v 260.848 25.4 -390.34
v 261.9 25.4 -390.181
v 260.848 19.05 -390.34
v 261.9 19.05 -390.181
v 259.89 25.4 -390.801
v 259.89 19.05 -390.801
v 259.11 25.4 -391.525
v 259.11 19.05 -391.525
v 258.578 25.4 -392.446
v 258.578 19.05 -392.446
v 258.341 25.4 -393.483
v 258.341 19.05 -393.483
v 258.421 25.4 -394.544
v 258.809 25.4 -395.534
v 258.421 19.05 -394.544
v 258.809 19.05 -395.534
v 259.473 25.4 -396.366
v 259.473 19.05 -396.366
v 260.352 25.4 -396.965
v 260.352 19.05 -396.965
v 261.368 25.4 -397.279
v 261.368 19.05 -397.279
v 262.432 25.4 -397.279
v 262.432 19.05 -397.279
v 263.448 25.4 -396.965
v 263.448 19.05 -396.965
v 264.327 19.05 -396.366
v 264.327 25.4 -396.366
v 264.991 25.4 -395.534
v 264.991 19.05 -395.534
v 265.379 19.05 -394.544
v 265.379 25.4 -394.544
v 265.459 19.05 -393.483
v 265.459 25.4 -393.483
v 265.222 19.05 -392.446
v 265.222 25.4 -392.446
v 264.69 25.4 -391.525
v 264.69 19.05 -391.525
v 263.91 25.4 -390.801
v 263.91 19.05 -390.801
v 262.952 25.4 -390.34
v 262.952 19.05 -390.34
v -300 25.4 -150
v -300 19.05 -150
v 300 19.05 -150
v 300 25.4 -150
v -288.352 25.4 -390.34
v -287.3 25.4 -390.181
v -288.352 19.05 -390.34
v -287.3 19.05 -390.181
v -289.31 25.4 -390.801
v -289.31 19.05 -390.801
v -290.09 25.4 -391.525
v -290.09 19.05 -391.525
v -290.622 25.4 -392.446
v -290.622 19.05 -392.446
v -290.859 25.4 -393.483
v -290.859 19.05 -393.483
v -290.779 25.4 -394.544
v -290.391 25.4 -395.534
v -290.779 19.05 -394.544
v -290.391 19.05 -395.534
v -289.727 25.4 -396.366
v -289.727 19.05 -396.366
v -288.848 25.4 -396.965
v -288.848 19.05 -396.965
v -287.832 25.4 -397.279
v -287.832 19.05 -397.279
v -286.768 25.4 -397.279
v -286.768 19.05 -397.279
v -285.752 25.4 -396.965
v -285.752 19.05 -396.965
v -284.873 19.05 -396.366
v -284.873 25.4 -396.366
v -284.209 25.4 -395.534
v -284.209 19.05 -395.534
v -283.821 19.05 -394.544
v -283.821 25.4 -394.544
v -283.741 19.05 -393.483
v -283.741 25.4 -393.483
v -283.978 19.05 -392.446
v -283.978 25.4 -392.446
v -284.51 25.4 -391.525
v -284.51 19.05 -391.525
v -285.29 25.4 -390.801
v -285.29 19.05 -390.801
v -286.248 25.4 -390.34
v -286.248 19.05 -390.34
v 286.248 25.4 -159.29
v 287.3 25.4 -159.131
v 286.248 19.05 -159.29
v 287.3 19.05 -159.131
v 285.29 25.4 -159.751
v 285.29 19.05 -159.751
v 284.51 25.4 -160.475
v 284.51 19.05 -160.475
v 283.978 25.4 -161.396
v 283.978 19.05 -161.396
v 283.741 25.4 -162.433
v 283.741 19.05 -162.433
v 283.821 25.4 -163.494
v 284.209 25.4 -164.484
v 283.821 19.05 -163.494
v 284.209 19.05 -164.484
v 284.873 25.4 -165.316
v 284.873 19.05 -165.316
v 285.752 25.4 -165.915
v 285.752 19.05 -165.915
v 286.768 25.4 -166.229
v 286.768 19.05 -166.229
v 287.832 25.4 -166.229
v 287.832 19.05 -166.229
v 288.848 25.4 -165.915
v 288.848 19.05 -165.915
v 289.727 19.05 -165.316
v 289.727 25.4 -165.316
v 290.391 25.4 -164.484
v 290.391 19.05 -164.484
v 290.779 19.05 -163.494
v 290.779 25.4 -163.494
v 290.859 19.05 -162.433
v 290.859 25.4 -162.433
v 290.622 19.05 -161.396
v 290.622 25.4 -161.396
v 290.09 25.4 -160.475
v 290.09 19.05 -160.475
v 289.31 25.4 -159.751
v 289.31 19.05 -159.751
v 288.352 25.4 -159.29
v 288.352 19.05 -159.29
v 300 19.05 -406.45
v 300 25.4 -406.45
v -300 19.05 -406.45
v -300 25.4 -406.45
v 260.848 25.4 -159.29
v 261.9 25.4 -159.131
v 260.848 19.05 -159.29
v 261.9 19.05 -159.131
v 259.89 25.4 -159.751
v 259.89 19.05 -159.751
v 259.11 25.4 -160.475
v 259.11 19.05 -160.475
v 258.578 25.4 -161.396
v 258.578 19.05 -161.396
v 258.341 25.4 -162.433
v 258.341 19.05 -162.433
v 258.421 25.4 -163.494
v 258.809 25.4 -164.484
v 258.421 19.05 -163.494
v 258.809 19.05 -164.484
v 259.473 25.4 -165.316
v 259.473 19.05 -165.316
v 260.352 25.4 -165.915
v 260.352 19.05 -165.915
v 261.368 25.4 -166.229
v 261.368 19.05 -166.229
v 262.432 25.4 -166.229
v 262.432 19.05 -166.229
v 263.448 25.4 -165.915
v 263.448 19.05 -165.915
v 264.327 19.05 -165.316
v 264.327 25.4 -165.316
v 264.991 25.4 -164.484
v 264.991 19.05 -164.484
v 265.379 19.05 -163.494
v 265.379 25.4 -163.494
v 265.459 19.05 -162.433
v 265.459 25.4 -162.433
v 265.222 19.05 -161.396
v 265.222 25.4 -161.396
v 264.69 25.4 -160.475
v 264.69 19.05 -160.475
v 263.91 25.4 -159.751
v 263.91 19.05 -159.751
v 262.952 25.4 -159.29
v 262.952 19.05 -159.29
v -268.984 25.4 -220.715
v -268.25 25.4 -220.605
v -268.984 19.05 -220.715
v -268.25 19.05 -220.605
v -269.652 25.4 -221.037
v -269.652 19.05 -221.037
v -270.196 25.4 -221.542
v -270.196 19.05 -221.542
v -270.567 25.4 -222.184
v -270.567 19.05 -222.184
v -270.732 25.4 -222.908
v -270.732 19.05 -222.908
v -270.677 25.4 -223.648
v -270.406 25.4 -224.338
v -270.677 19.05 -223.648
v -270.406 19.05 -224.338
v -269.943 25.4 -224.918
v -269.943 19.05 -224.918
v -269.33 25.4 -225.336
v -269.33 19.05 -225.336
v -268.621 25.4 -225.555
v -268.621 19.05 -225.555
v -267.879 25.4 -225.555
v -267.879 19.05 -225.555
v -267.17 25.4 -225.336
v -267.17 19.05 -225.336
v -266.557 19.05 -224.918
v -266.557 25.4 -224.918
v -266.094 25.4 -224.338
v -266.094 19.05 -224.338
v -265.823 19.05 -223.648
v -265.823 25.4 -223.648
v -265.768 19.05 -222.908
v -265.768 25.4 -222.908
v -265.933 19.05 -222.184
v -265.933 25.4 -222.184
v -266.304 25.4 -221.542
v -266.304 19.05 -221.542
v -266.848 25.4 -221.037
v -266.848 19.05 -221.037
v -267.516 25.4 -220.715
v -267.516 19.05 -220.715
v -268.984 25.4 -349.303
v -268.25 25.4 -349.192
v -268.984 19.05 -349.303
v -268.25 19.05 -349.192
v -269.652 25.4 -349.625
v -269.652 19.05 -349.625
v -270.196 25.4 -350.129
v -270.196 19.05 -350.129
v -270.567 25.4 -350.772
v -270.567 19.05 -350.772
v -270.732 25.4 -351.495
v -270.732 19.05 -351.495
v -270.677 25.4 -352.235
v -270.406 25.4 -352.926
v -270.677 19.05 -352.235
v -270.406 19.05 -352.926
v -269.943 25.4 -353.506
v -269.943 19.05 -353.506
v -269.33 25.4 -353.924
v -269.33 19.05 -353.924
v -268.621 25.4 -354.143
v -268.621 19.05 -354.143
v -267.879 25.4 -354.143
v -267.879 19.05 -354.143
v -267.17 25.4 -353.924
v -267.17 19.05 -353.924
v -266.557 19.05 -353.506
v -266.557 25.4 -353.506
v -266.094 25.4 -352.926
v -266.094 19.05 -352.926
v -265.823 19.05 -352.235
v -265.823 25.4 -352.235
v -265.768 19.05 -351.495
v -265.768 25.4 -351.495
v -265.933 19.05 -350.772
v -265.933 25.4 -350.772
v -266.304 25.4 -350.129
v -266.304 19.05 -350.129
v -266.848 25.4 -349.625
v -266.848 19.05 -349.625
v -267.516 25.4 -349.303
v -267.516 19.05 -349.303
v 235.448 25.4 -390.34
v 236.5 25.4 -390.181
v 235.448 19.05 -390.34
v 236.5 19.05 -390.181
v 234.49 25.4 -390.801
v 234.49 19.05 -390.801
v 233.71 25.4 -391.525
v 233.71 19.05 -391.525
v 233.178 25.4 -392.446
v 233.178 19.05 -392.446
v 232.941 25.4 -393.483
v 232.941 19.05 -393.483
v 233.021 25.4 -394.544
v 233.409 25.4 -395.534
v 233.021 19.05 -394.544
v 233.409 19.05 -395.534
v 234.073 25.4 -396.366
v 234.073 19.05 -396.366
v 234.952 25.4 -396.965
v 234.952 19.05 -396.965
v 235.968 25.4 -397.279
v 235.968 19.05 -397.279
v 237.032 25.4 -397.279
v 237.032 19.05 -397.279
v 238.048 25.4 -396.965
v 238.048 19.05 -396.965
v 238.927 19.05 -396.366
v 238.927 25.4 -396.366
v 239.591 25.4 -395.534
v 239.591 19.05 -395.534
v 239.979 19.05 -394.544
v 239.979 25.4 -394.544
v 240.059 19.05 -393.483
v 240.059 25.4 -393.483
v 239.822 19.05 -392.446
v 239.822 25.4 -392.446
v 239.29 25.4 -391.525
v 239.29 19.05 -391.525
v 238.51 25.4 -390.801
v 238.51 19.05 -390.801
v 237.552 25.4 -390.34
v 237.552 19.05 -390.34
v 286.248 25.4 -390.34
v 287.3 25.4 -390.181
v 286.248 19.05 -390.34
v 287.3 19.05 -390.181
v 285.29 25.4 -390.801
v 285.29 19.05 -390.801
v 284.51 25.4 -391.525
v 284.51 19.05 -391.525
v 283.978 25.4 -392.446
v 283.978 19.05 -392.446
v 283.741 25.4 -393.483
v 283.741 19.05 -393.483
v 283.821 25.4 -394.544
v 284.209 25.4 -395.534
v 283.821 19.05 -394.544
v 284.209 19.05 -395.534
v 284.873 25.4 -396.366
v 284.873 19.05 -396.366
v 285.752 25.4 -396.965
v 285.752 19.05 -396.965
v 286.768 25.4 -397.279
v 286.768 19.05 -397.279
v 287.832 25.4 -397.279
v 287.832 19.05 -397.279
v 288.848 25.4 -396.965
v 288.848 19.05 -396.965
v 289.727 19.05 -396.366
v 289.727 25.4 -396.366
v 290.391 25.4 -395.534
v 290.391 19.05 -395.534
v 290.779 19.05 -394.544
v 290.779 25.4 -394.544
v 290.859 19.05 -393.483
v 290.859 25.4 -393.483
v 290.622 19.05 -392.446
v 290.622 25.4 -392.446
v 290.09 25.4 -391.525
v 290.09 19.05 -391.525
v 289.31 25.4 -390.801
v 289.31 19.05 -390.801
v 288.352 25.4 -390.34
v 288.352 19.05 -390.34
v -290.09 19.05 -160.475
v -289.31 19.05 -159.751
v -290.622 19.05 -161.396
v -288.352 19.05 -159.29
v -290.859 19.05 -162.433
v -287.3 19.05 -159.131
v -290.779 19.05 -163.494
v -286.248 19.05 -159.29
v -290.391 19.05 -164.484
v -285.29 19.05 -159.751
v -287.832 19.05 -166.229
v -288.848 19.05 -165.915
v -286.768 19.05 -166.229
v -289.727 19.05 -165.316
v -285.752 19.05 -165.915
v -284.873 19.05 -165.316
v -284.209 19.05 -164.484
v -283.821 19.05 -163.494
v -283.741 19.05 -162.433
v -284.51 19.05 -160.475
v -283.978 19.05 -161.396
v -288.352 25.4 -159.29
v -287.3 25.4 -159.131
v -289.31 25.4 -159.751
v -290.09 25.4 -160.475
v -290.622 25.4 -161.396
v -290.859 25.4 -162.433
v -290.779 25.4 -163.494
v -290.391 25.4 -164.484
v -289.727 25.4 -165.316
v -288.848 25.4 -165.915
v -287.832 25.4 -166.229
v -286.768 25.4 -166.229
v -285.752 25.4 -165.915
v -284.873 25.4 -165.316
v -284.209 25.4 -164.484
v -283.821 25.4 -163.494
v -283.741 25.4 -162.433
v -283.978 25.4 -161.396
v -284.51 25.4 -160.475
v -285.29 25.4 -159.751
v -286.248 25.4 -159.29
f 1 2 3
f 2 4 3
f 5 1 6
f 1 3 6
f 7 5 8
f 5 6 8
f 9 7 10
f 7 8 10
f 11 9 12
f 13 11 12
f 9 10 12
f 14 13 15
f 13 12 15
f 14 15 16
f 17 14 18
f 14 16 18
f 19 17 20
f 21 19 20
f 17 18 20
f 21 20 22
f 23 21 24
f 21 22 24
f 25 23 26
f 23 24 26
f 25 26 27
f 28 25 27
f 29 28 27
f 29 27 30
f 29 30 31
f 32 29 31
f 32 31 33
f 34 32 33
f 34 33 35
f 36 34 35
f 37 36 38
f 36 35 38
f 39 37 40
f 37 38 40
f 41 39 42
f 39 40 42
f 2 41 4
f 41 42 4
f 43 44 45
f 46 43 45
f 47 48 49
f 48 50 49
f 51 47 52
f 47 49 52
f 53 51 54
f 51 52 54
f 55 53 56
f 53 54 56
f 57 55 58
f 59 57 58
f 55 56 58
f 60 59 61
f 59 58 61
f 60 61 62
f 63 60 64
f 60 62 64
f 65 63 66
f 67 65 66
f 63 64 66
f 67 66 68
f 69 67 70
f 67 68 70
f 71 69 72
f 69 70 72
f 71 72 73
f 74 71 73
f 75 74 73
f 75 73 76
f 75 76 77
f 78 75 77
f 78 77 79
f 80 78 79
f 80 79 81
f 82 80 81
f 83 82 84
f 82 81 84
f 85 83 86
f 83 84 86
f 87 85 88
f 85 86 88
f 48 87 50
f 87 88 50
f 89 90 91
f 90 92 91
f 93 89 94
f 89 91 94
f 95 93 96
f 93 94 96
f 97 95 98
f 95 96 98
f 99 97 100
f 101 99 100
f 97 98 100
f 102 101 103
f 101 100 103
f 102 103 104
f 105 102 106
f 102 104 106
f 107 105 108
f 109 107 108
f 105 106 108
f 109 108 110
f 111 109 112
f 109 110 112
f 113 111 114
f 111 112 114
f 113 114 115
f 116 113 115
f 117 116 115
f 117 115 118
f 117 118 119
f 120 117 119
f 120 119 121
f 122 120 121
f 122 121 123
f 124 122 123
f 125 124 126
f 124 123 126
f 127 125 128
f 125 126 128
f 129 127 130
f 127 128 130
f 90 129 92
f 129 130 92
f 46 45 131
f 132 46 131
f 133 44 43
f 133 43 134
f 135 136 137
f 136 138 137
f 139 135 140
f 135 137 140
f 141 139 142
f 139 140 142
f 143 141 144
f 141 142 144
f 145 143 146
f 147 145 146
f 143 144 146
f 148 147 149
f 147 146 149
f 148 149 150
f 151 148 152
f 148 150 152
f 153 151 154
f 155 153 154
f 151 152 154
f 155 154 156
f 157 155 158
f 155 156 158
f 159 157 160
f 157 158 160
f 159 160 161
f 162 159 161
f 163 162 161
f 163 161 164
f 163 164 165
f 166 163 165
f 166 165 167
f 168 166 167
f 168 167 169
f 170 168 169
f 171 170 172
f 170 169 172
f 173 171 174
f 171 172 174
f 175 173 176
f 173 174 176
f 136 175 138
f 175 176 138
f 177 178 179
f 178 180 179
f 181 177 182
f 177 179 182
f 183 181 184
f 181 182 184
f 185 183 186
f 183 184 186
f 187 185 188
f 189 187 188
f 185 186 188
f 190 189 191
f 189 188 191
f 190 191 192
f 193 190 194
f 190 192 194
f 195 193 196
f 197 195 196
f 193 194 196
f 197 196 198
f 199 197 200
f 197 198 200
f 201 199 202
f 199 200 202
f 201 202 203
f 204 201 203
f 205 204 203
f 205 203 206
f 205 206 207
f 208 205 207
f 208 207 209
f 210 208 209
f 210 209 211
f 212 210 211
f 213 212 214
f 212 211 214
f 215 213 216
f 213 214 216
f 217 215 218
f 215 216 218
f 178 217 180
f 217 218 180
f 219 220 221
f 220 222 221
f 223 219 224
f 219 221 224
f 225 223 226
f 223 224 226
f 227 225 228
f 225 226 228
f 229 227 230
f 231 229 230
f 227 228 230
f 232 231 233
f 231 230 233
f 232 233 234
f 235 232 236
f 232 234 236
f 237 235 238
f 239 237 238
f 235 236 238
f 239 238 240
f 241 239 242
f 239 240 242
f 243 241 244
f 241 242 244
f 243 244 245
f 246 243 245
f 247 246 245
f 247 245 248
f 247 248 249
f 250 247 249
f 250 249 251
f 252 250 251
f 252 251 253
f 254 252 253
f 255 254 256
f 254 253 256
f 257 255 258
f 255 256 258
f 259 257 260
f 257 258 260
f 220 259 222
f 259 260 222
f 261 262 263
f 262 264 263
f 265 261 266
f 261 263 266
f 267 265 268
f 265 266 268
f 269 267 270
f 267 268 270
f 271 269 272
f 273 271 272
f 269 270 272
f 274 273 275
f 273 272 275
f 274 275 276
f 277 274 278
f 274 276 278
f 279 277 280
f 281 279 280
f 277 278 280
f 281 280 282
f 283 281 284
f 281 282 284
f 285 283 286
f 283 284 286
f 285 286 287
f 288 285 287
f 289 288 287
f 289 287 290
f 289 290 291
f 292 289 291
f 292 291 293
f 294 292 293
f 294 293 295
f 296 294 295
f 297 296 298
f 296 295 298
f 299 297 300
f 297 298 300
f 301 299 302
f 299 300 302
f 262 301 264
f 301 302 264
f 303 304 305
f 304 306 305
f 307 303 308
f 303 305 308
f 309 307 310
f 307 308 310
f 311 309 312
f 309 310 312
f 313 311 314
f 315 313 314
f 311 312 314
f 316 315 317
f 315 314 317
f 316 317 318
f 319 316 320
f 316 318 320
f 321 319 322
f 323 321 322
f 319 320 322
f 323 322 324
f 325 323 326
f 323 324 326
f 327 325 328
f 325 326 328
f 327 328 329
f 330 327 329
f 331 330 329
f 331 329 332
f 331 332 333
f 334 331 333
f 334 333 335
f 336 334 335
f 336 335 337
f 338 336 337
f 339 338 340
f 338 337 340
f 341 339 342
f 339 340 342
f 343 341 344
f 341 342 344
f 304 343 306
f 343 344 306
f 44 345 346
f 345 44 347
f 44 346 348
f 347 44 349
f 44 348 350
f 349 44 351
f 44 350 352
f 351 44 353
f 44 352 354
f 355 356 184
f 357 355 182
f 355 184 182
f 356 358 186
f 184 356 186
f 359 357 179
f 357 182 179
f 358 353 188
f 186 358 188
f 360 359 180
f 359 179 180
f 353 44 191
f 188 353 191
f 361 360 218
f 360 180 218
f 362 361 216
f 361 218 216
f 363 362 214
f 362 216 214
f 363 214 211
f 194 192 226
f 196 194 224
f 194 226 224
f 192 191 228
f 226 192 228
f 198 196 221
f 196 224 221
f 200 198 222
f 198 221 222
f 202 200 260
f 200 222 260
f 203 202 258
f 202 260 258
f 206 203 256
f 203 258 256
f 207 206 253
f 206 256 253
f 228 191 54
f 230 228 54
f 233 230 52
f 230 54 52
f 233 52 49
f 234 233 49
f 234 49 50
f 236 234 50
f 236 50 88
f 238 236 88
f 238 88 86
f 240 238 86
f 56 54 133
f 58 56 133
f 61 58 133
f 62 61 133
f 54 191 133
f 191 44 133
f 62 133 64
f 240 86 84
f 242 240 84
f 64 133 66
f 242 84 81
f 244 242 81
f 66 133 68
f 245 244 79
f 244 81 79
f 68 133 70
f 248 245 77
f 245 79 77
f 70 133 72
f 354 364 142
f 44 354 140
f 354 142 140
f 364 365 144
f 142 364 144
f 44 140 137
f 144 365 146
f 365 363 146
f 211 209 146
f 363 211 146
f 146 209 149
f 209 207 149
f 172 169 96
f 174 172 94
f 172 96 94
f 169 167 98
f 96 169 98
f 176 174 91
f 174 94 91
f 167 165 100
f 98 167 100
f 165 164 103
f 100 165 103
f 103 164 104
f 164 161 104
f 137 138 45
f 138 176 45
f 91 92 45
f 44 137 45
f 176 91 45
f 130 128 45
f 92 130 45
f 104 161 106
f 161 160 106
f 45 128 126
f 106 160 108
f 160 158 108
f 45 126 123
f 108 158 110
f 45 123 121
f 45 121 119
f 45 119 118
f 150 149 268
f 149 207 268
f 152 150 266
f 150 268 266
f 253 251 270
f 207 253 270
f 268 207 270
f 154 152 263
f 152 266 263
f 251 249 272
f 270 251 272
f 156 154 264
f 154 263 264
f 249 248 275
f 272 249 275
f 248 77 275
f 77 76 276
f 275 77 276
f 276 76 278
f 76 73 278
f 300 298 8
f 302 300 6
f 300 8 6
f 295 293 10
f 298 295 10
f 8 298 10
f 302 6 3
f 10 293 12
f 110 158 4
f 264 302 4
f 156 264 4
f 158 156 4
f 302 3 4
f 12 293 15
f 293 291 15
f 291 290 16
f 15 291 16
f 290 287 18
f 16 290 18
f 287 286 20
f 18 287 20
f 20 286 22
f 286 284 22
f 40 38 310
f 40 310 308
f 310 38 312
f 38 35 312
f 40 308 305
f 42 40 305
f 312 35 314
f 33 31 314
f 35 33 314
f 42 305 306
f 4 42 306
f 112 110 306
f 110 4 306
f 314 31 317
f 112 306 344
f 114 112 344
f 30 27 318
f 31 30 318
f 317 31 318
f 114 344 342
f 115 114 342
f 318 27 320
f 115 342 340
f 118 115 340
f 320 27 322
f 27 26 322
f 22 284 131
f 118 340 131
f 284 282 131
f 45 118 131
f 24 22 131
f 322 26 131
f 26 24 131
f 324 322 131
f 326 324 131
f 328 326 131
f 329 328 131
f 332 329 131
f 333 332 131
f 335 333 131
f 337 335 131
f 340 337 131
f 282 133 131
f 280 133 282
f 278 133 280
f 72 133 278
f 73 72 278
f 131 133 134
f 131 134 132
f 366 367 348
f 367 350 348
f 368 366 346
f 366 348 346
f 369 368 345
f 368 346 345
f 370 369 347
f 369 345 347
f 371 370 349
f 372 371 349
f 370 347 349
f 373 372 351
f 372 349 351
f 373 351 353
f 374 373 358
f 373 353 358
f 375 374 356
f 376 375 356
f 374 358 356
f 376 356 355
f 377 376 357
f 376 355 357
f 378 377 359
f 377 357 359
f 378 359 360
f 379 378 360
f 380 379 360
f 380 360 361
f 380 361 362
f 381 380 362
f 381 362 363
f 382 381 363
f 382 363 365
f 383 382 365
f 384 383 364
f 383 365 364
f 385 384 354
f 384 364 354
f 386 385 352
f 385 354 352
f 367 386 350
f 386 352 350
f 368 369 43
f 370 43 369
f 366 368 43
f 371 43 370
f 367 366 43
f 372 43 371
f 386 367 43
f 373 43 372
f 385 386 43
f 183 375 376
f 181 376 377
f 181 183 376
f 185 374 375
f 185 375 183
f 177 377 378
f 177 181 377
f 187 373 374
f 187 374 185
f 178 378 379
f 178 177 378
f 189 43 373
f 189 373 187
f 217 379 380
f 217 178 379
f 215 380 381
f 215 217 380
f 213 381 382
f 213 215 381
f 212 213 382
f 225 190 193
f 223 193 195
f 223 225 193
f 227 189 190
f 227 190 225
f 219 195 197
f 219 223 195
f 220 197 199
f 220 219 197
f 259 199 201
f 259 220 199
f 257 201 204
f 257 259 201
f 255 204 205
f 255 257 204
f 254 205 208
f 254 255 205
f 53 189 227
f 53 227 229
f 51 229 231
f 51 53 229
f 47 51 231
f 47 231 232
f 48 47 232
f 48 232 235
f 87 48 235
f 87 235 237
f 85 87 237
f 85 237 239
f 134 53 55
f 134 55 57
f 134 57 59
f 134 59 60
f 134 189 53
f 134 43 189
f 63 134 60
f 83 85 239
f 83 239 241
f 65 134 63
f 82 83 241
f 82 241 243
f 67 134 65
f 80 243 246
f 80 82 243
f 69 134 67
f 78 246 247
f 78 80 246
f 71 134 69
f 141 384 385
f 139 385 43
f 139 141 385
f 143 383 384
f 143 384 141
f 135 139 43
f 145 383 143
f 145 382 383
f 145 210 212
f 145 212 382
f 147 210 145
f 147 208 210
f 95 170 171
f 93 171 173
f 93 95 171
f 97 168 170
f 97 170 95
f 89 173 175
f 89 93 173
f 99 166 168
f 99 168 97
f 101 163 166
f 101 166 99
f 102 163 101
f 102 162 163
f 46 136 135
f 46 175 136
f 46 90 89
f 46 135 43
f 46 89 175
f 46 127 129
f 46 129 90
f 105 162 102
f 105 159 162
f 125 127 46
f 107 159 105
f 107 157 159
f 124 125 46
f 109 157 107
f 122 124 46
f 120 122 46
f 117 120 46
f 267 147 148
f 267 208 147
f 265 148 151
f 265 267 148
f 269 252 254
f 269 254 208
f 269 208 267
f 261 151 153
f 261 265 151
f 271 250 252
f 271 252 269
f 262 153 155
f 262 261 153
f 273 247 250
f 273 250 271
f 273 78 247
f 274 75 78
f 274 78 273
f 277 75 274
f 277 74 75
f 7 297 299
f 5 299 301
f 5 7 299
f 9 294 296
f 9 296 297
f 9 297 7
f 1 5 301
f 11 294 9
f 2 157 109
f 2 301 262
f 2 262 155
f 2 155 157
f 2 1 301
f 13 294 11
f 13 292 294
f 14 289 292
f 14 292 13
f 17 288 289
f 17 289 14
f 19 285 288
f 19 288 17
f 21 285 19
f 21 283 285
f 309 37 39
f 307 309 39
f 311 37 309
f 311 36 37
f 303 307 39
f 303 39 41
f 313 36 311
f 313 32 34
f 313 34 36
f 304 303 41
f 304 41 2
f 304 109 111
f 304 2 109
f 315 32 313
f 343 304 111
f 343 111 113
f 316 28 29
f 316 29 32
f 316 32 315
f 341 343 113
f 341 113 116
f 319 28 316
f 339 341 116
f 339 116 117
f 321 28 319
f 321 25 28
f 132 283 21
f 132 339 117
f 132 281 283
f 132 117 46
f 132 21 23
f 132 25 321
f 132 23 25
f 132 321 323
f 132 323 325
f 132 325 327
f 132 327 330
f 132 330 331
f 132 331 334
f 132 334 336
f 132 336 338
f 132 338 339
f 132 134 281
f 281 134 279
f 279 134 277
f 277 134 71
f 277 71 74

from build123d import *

# Parameters (mm, degrees)
BOSS_EXTRUDE1_START              = 19.05
SKETCH2_W                        = 600
SKETCH2_H                        = 256.45
BOSS_EXTRUDE1_DEPTH              = 6.35
BOSS_EXTRUDE2_START              = 19.05
SKETCH2_4_W                      = 455.092
SKETCH2_4_H                      = 256.45
BOSS_EXTRUDE2_DEPTH              = 6.35
BOSS_EXTRUDE3_START              = 19.05
SKETCH2_5_W                      = 455.092
SKETCH2_5_H                      = 300
BOSS_EXTRUDE3_DEPTH              = 6.35
SKETCH8_W                        = 3.5687
SKETCH8_H                        = 6.35
F_1_4_CLEARANCE_HOLE2_AT_2_COUNT = 2
F_1_4_CLEARANCE_HOLE2_AT_2_PITCH = 231.05
F_1_4_CLEARANCE_HOLE2_AT_3_COUNT = 2
F_1_4_CLEARANCE_HOLE2_AT_3_PITCH = 595.822744195
F_1_4_CLEARANCE_HOLE2_AT_4_COUNT = 2
F_1_4_CLEARANCE_HOLE2_AT_4_PITCH = 619.31354135
F_1_4_CLEARANCE_HOLE2_AT_5_COUNT = 2
F_1_4_CLEARANCE_HOLE2_AT_5_PITCH = 523.8
F_1_4_CLEARANCE_HOLE2_AT_6_COUNT = 2
F_1_4_CLEARANCE_HOLE2_AT_6_PITCH = 549.2
F_1_4_CLEARANCE_HOLE2_AT_7_COUNT = 2
F_1_4_CLEARANCE_HOLE2_AT_7_PITCH = 574.6
SKETCH10_W                       = 3.5687
SKETCH10_H                       = 6.35
F_1_4_CLEARANCE_HOLE3_AT_2_COUNT = 2
F_1_4_CLEARANCE_HOLE3_AT_2_PITCH = 25.4
F_1_4_CLEARANCE_HOLE3_AT_3_COUNT = 2
F_1_4_CLEARANCE_HOLE3_AT_3_PITCH = 50.8
F_1_4_CLEARANCE_HOLE3_AT_4_COUNT = 2
F_1_4_CLEARANCE_HOLE3_AT_4_PITCH = 231.05
F_1_4_CLEARANCE_HOLE3_AT_5_COUNT = 2
F_1_4_CLEARANCE_HOLE3_AT_5_PITCH = 487.872234672
F_1_4_CLEARANCE_HOLE3_AT_6_COUNT = 2
F_1_4_CLEARANCE_HOLE3_AT_6_PITCH = 476.368698976
F_1_4_CLEARANCE_HOLE3_AT_7_COUNT = 2
F_1_4_CLEARANCE_HOLE3_AT_7_PITCH = 429.692
SKETCH12_W                       = 3.5687
SKETCH12_H                       = 6.35
F_1_4_CLEARANCE_HOLE4_AT_2_COUNT = 2
F_1_4_CLEARANCE_HOLE4_AT_2_PITCH = 25.4
F_1_4_CLEARANCE_HOLE4_AT_3_COUNT = 2
F_1_4_CLEARANCE_HOLE4_AT_3_PITCH = 249.2
F_1_4_CLEARANCE_HOLE4_AT_4_COUNT = 2
F_1_4_CLEARANCE_HOLE4_AT_4_PITCH = 496.725130091
F_1_4_CLEARANCE_HOLE4_AT_5_COUNT = 2
F_1_4_CLEARANCE_HOLE4_AT_5_PITCH = 429.692
F_1_4_CLEARANCE_HOLE4_AT_6_COUNT = 2
F_1_4_CLEARANCE_HOLE4_AT_6_PITCH = 430.442069115
SKETCH14_W                       = 2.4892
SKETCH14_H                       = 6.35
F_8_CLEARANCE_HOLE2_AT_2_COUNT   = 2
F_8_CLEARANCE_HOLE2_AT_2_PITCH   = 128.5875
SKETCH16_W                       = 2.4892
SKETCH16_H                       = 6.35
F_8_CLEARANCE_HOLE3_AT_2_COUNT   = 2
F_8_CLEARANCE_HOLE3_AT_2_PITCH   = 128.5875
SKETCH17_R                       = 3.5687
BOSS_EXTRUDE4_DEPTH              = 6.35
FILLET2_R                        = 6.35
SKETCH18_W                       = 152.4
SKETCH18_H                       = 25.4
SKETCH18_R                       = 3.5687
BOSS_EXTRUDE5_DEPTH              = 6.35
SKETCH19_W                       = 25.4
SKETCH19_H                       = 101.6
SKETCH19_R                       = 3.5687
BOSS_EXTRUDE6_DEPTH              = 6.35


with BuildPart() as part:
    # Sketch2 → Boss-Extrude1 (new body)
    with BuildSketch(Plane(origin=(0, 0, 0), x_dir=(1, 0, 0), z_dir=(0, 1, 0)).offset(BOSS_EXTRUDE1_START)):
        with Locations((0, 278.225)):
            Rectangle(SKETCH2_W, SKETCH2_H)
    extrude(amount=BOSS_EXTRUDE1_DEPTH)

    # Sketch8 → 1/4 Clearance Hole2 (revolve, cut)
    with BuildSketch(Plane(origin=(-287.3, 25.4, -393.75), x_dir=(0, 0, 1), z_dir=(1, 0, 0))):
        with Locations((1.78435, 3.175)):
            Rectangle(SKETCH8_W, SKETCH8_H)
    f_1_4_clearance_hole2 = revolve(axis=Axis((-287.3, 31.75, -393.75), (0, -1, 0)), mode=Mode.SUBTRACT)

    # 1/4 Clearance Hole2 at 2: 1/4 Clearance Hole2 ×2
    with Locations(*[(0, 0, i * F_1_4_CLEARANCE_HOLE2_AT_2_PITCH) for i in range(1, F_1_4_CLEARANCE_HOLE2_AT_2_COUNT)]):
        add(f_1_4_clearance_hole2, mode=Mode.SUBTRACT)

    # 1/4 Clearance Hole2 at 3: 1/4 Clearance Hole2 ×2
    with Locations(*[Vector(0.9217506470687957, 0, 0.3877831154501913) * (i * F_1_4_CLEARANCE_HOLE2_AT_3_PITCH) for i in range(1, F_1_4_CLEARANCE_HOLE2_AT_3_COUNT)]):
        add(f_1_4_clearance_hole2, mode=Mode.SUBTRACT)

    # 1/4 Clearance Hole2 at 4: 1/4 Clearance Hole2 ×2
    with Locations(*[Vector(0.9278014473041833, 0, 0.37307435502894426) * (i * F_1_4_CLEARANCE_HOLE2_AT_4_PITCH) for i in range(1, F_1_4_CLEARANCE_HOLE2_AT_4_COUNT)]):
        add(f_1_4_clearance_hole2, mode=Mode.SUBTRACT)

    # 1/4 Clearance Hole2 at 5: 1/4 Clearance Hole2 ×2
    with Locations(*[(i * F_1_4_CLEARANCE_HOLE2_AT_5_PITCH, 0, 0) for i in range(1, F_1_4_CLEARANCE_HOLE2_AT_5_COUNT)]):
        add(f_1_4_clearance_hole2, mode=Mode.SUBTRACT)

    # 1/4 Clearance Hole2 at 6: 1/4 Clearance Hole2 ×2
    with Locations(*[(i * F_1_4_CLEARANCE_HOLE2_AT_6_PITCH, 0, 0) for i in range(1, F_1_4_CLEARANCE_HOLE2_AT_6_COUNT)]):
        add(f_1_4_clearance_hole2, mode=Mode.SUBTRACT)

    # 1/4 Clearance Hole2 at 7: 1/4 Clearance Hole2 ×2
    with Locations(*[(i * F_1_4_CLEARANCE_HOLE2_AT_7_PITCH, 0, 0) for i in range(1, F_1_4_CLEARANCE_HOLE2_AT_7_COUNT)]):
        add(f_1_4_clearance_hole2, mode=Mode.SUBTRACT)

    # Sketch14 → #8 Clearance Hole2 (revolve, cut)
    with BuildSketch(Plane(origin=(-268.25, 25.4, -351.68125), x_dir=(0, 0, 1), z_dir=(1, 0, 0))):
        with Locations((1.2446, 3.175)):
            Rectangle(SKETCH14_W, SKETCH14_H)
    f_8_clearance_hole2 = revolve(axis=Axis((-268.25, 31.75, -351.68125), (0, -1, 0)), mode=Mode.SUBTRACT)

    # #8 Clearance Hole2 at 2: #8 Clearance Hole2 ×2
    with Locations(*[(0, 0, i * F_8_CLEARANCE_HOLE2_AT_2_PITCH) for i in range(1, F_8_CLEARANCE_HOLE2_AT_2_COUNT)]):
        add(f_8_clearance_hole2, mode=Mode.SUBTRACT)


with BuildPart() as body_2:
    # Sketch2<4> → Boss-Extrude2 (new body)
    with BuildSketch(Plane(origin=(0, 0, 0), x_dir=(1, 0, 0), z_dir=(0, 1, 0)).offset(BOSS_EXTRUDE2_START)):
        with Locations((527.546, 278.225)):
            Rectangle(SKETCH2_4_W, SKETCH2_4_H)
    extrude(amount=BOSS_EXTRUDE2_DEPTH)

    # Sketch10 → 1/4 Clearance Hole3 (revolve, cut)
    with BuildSketch(Plane(origin=(312.7, 25.4, -393.75), x_dir=(0, 0, 1), z_dir=(1, 0, 0))):
        with Locations((1.78435, 3.175)):
            Rectangle(SKETCH10_W, SKETCH10_H)
    f_1_4_clearance_hole3 = revolve(axis=Axis((312.7, 31.75, -393.75), (0, -1, 0)), mode=Mode.SUBTRACT)

    # 1/4 Clearance Hole3 at 2: 1/4 Clearance Hole3 ×2
    with Locations(*[(i * F_1_4_CLEARANCE_HOLE3_AT_2_PITCH, 0, 0) for i in range(1, F_1_4_CLEARANCE_HOLE3_AT_2_COUNT)]):
        add(f_1_4_clearance_hole3, mode=Mode.SUBTRACT)

    # 1/4 Clearance Hole3 at 3: 1/4 Clearance Hole3 ×2
    with Locations(*[(i * F_1_4_CLEARANCE_HOLE3_AT_3_PITCH, 0, 0) for i in range(1, F_1_4_CLEARANCE_HOLE3_AT_3_COUNT)]):
        add(f_1_4_clearance_hole3, mode=Mode.SUBTRACT)

    # 1/4 Clearance Hole3 at 4: 1/4 Clearance Hole3 ×2
    with Locations(*[(0, 0, i * F_1_4_CLEARANCE_HOLE3_AT_4_PITCH) for i in range(1, F_1_4_CLEARANCE_HOLE3_AT_4_COUNT)]):
        add(f_1_4_clearance_hole3, mode=Mode.SUBTRACT)

    # 1/4 Clearance Hole3 at 5: 1/4 Clearance Hole3 ×2
    with Locations(*[Vector(0.880746985506873, 0, 0.47358710658183684) * (i * F_1_4_CLEARANCE_HOLE3_AT_5_PITCH) for i in range(1, F_1_4_CLEARANCE_HOLE3_AT_5_COUNT)]):
        add(f_1_4_clearance_hole3, mode=Mode.SUBTRACT)

    # 1/4 Clearance Hole3 at 6: 1/4 Clearance Hole3 ×2
    with Locations(*[Vector(0.9020156045595491, 0, 0.4317034272866863) * (i * F_1_4_CLEARANCE_HOLE3_AT_6_PITCH) for i in range(1, F_1_4_CLEARANCE_HOLE3_AT_6_COUNT)]):
        add(f_1_4_clearance_hole3, mode=Mode.SUBTRACT)

    # 1/4 Clearance Hole3 at 7: 1/4 Clearance Hole3 ×2
    with Locations(*[(i * F_1_4_CLEARANCE_HOLE3_AT_7_PITCH, 0, 0) for i in range(1, F_1_4_CLEARANCE_HOLE3_AT_7_COUNT)]):
        add(f_1_4_clearance_hole3, mode=Mode.SUBTRACT)

    # Sketch16 → #8 Clearance Hole3 (revolve, cut)
    with BuildSketch(Plane(origin=(723.342, 25.4, -351.68125), x_dir=(0, 0, 1), z_dir=(1, 0, 0))):
        with Locations((1.2446, 3.175)):
            Rectangle(SKETCH16_W, SKETCH16_H)
    f_8_clearance_hole3 = revolve(axis=Axis((723.342, 31.75, -351.68125), (0, -1, 0)), mode=Mode.SUBTRACT)

    # #8 Clearance Hole3 at 2: #8 Clearance Hole3 ×2
    with Locations(*[(0, 0, i * F_8_CLEARANCE_HOLE3_AT_2_PITCH) for i in range(1, F_8_CLEARANCE_HOLE3_AT_2_COUNT)]):
        add(f_8_clearance_hole3, mode=Mode.SUBTRACT)


with BuildPart() as body_3:
    # Sketch2<5> → Boss-Extrude3 (new body)
    with BuildSketch(Plane(origin=(0, 0, 0), x_dir=(1, 0, 0), z_dir=(0, 1, 0)).offset(BOSS_EXTRUDE3_START)):
        with Locations((527.546, 0)):
            Rectangle(SKETCH2_5_W, SKETCH2_5_H)
    extrude(amount=BOSS_EXTRUDE3_DEPTH)

    # Sketch12 → 1/4 Clearance Hole4 (revolve, cut)
    with BuildSketch(Plane(origin=(312.7, 25.4, -111.9), x_dir=(0, 0, 1), z_dir=(1, 0, 0))):
        with Locations((1.78435, 3.175)):
            Rectangle(SKETCH12_W, SKETCH12_H)
    f_1_4_clearance_hole4 = revolve(axis=Axis((312.7, 31.75, -111.9), (0, -1, 0)), mode=Mode.SUBTRACT)

    # 1/4 Clearance Hole4 at 2: 1/4 Clearance Hole4 ×2
    with Locations(*[(0, 0, -i * F_1_4_CLEARANCE_HOLE4_AT_2_PITCH) for i in range(1, F_1_4_CLEARANCE_HOLE4_AT_2_COUNT)]):
        add(f_1_4_clearance_hole4, mode=Mode.SUBTRACT)

    # 1/4 Clearance Hole4 at 3: 1/4 Clearance Hole4 ×2
    with Locations(*[(0, 0, i * F_1_4_CLEARANCE_HOLE4_AT_3_PITCH) for i in range(1, F_1_4_CLEARANCE_HOLE4_AT_3_COUNT)]):
        add(f_1_4_clearance_hole4, mode=Mode.SUBTRACT)

    # 1/4 Clearance Hole4 at 4: 1/4 Clearance Hole4 ×2
    with Locations(*[Vector(0.865049851456502, 0, 0.5016859121951541) * (i * F_1_4_CLEARANCE_HOLE4_AT_4_PITCH) for i in range(1, F_1_4_CLEARANCE_HOLE4_AT_4_COUNT)]):
        add(f_1_4_clearance_hole4, mode=Mode.SUBTRACT)

    # 1/4 Clearance Hole4 at 5: 1/4 Clearance Hole4 ×2
    with Locations(*[(i * F_1_4_CLEARANCE_HOLE4_AT_5_PITCH, 0, 0) for i in range(1, F_1_4_CLEARANCE_HOLE4_AT_5_COUNT)]):
        add(f_1_4_clearance_hole4, mode=Mode.SUBTRACT)

    # 1/4 Clearance Hole4 at 6: 1/4 Clearance Hole4 ×2
    with Locations(*[Vector(0.998257444685787, 0, -0.05900910208944768) * (i * F_1_4_CLEARANCE_HOLE4_AT_6_PITCH) for i in range(1, F_1_4_CLEARANCE_HOLE4_AT_6_COUNT)]):
        add(f_1_4_clearance_hole4, mode=Mode.SUBTRACT)


with BuildPart() as body_4:
    # Sketch17 → Boss-Extrude4 (new body)
    with BuildSketch(Plane(origin=(0, 25.4, 0), x_dir=(1, 0, 0), z_dir=(0, 1, 0))):
        Polygon((249.2, 150), (249.2, 175.4), (325.4, 175.4), (325.4, 99.2), (300, 99.2), (300, 150), align=None)
        with Locations(Location((261.9, 162.7, 0), (0, 0, 270))):
            Circle(SKETCH17_R, mode=Mode.SUBTRACT)
        with Locations(Location((287.3, 162.7, 0), (0, 0, 270))):
            Circle(SKETCH17_R, mode=Mode.SUBTRACT)
        with Locations(Location((312.7, 162.7, 0), (0, 0, 270))):
            Circle(SKETCH17_R, mode=Mode.SUBTRACT)
        with Locations(Location((312.7, 137.3, 0), (0, 0, 270))):
            Circle(SKETCH17_R, mode=Mode.SUBTRACT)
        with Locations(Location((312.7, 111.9, 0), (0, 0, 270))):
            Circle(SKETCH17_R, mode=Mode.SUBTRACT)
    extrude(amount=BOSS_EXTRUDE4_DEPTH)

    # Fillet2
    fillet2_edges = [body_4.edges().sort_by_distance(p)[0] for p in [
        (249.2, 28.575, -150),
        (249.2, 28.575, -175.4),
        (325.4, 28.575, -175.4),
        (325.4, 28.575, -99.2),
        (300, 28.575, -99.2),
    ]]
    fillet(fillet2_edges, radius=FILLET2_R)


with BuildPart() as body_5:
    # Sketch18 → Boss-Extrude5 (new body)
    with BuildSketch(Plane(origin=(0, 25.4, 0), x_dir=(1, 0, 0), z_dir=(0, 1, 0))):
        with Locations((300, 393.75)):
            Rectangle(SKETCH18_W, SKETCH18_H)
        with Locations(Location((236.5, 393.75, 0), (0, 0, 270))):
            Circle(SKETCH18_R, mode=Mode.SUBTRACT)
        with Locations(Location((261.9, 393.75, 0), (0, 0, 270))):
            Circle(SKETCH18_R, mode=Mode.SUBTRACT)
        with Locations(Location((287.3, 393.75, 0), (0, 0, 270))):
            Circle(SKETCH18_R, mode=Mode.SUBTRACT)
        with Locations(Location((312.7, 393.75, 0), (0, 0, 270))):
            Circle(SKETCH18_R, mode=Mode.SUBTRACT)
        with Locations(Location((338.1, 393.75, 0), (0, 0, 270))):
            Circle(SKETCH18_R, mode=Mode.SUBTRACT)
        with Locations(Location((363.5, 393.75, 0), (0, 0, 270))):
            Circle(SKETCH18_R, mode=Mode.SUBTRACT)
    extrude(amount=BOSS_EXTRUDE5_DEPTH)


with BuildPart() as body_6:
    # Sketch19 → Boss-Extrude6 (new body)
    with BuildSketch(Plane(origin=(0, 25.4, 0), x_dir=(1, 0, 0), z_dir=(0, 1, 0))):
        with Locations((742.392, 150)):
            Rectangle(SKETCH19_W, SKETCH19_H)
        with Locations((742.392, 111.9)):
            Circle(SKETCH19_R, mode=Mode.SUBTRACT)
        with Locations((742.392, 137.3)):
            Circle(SKETCH19_R, mode=Mode.SUBTRACT)
        with Locations((742.392, 162.7)):
            Circle(SKETCH19_R, mode=Mode.SUBTRACT)
        with Locations((742.392, 188.1)):
            Circle(SKETCH19_R, mode=Mode.SUBTRACT)
    extrude(amount=BOSS_EXTRUDE6_DEPTH)


solid = part.part
